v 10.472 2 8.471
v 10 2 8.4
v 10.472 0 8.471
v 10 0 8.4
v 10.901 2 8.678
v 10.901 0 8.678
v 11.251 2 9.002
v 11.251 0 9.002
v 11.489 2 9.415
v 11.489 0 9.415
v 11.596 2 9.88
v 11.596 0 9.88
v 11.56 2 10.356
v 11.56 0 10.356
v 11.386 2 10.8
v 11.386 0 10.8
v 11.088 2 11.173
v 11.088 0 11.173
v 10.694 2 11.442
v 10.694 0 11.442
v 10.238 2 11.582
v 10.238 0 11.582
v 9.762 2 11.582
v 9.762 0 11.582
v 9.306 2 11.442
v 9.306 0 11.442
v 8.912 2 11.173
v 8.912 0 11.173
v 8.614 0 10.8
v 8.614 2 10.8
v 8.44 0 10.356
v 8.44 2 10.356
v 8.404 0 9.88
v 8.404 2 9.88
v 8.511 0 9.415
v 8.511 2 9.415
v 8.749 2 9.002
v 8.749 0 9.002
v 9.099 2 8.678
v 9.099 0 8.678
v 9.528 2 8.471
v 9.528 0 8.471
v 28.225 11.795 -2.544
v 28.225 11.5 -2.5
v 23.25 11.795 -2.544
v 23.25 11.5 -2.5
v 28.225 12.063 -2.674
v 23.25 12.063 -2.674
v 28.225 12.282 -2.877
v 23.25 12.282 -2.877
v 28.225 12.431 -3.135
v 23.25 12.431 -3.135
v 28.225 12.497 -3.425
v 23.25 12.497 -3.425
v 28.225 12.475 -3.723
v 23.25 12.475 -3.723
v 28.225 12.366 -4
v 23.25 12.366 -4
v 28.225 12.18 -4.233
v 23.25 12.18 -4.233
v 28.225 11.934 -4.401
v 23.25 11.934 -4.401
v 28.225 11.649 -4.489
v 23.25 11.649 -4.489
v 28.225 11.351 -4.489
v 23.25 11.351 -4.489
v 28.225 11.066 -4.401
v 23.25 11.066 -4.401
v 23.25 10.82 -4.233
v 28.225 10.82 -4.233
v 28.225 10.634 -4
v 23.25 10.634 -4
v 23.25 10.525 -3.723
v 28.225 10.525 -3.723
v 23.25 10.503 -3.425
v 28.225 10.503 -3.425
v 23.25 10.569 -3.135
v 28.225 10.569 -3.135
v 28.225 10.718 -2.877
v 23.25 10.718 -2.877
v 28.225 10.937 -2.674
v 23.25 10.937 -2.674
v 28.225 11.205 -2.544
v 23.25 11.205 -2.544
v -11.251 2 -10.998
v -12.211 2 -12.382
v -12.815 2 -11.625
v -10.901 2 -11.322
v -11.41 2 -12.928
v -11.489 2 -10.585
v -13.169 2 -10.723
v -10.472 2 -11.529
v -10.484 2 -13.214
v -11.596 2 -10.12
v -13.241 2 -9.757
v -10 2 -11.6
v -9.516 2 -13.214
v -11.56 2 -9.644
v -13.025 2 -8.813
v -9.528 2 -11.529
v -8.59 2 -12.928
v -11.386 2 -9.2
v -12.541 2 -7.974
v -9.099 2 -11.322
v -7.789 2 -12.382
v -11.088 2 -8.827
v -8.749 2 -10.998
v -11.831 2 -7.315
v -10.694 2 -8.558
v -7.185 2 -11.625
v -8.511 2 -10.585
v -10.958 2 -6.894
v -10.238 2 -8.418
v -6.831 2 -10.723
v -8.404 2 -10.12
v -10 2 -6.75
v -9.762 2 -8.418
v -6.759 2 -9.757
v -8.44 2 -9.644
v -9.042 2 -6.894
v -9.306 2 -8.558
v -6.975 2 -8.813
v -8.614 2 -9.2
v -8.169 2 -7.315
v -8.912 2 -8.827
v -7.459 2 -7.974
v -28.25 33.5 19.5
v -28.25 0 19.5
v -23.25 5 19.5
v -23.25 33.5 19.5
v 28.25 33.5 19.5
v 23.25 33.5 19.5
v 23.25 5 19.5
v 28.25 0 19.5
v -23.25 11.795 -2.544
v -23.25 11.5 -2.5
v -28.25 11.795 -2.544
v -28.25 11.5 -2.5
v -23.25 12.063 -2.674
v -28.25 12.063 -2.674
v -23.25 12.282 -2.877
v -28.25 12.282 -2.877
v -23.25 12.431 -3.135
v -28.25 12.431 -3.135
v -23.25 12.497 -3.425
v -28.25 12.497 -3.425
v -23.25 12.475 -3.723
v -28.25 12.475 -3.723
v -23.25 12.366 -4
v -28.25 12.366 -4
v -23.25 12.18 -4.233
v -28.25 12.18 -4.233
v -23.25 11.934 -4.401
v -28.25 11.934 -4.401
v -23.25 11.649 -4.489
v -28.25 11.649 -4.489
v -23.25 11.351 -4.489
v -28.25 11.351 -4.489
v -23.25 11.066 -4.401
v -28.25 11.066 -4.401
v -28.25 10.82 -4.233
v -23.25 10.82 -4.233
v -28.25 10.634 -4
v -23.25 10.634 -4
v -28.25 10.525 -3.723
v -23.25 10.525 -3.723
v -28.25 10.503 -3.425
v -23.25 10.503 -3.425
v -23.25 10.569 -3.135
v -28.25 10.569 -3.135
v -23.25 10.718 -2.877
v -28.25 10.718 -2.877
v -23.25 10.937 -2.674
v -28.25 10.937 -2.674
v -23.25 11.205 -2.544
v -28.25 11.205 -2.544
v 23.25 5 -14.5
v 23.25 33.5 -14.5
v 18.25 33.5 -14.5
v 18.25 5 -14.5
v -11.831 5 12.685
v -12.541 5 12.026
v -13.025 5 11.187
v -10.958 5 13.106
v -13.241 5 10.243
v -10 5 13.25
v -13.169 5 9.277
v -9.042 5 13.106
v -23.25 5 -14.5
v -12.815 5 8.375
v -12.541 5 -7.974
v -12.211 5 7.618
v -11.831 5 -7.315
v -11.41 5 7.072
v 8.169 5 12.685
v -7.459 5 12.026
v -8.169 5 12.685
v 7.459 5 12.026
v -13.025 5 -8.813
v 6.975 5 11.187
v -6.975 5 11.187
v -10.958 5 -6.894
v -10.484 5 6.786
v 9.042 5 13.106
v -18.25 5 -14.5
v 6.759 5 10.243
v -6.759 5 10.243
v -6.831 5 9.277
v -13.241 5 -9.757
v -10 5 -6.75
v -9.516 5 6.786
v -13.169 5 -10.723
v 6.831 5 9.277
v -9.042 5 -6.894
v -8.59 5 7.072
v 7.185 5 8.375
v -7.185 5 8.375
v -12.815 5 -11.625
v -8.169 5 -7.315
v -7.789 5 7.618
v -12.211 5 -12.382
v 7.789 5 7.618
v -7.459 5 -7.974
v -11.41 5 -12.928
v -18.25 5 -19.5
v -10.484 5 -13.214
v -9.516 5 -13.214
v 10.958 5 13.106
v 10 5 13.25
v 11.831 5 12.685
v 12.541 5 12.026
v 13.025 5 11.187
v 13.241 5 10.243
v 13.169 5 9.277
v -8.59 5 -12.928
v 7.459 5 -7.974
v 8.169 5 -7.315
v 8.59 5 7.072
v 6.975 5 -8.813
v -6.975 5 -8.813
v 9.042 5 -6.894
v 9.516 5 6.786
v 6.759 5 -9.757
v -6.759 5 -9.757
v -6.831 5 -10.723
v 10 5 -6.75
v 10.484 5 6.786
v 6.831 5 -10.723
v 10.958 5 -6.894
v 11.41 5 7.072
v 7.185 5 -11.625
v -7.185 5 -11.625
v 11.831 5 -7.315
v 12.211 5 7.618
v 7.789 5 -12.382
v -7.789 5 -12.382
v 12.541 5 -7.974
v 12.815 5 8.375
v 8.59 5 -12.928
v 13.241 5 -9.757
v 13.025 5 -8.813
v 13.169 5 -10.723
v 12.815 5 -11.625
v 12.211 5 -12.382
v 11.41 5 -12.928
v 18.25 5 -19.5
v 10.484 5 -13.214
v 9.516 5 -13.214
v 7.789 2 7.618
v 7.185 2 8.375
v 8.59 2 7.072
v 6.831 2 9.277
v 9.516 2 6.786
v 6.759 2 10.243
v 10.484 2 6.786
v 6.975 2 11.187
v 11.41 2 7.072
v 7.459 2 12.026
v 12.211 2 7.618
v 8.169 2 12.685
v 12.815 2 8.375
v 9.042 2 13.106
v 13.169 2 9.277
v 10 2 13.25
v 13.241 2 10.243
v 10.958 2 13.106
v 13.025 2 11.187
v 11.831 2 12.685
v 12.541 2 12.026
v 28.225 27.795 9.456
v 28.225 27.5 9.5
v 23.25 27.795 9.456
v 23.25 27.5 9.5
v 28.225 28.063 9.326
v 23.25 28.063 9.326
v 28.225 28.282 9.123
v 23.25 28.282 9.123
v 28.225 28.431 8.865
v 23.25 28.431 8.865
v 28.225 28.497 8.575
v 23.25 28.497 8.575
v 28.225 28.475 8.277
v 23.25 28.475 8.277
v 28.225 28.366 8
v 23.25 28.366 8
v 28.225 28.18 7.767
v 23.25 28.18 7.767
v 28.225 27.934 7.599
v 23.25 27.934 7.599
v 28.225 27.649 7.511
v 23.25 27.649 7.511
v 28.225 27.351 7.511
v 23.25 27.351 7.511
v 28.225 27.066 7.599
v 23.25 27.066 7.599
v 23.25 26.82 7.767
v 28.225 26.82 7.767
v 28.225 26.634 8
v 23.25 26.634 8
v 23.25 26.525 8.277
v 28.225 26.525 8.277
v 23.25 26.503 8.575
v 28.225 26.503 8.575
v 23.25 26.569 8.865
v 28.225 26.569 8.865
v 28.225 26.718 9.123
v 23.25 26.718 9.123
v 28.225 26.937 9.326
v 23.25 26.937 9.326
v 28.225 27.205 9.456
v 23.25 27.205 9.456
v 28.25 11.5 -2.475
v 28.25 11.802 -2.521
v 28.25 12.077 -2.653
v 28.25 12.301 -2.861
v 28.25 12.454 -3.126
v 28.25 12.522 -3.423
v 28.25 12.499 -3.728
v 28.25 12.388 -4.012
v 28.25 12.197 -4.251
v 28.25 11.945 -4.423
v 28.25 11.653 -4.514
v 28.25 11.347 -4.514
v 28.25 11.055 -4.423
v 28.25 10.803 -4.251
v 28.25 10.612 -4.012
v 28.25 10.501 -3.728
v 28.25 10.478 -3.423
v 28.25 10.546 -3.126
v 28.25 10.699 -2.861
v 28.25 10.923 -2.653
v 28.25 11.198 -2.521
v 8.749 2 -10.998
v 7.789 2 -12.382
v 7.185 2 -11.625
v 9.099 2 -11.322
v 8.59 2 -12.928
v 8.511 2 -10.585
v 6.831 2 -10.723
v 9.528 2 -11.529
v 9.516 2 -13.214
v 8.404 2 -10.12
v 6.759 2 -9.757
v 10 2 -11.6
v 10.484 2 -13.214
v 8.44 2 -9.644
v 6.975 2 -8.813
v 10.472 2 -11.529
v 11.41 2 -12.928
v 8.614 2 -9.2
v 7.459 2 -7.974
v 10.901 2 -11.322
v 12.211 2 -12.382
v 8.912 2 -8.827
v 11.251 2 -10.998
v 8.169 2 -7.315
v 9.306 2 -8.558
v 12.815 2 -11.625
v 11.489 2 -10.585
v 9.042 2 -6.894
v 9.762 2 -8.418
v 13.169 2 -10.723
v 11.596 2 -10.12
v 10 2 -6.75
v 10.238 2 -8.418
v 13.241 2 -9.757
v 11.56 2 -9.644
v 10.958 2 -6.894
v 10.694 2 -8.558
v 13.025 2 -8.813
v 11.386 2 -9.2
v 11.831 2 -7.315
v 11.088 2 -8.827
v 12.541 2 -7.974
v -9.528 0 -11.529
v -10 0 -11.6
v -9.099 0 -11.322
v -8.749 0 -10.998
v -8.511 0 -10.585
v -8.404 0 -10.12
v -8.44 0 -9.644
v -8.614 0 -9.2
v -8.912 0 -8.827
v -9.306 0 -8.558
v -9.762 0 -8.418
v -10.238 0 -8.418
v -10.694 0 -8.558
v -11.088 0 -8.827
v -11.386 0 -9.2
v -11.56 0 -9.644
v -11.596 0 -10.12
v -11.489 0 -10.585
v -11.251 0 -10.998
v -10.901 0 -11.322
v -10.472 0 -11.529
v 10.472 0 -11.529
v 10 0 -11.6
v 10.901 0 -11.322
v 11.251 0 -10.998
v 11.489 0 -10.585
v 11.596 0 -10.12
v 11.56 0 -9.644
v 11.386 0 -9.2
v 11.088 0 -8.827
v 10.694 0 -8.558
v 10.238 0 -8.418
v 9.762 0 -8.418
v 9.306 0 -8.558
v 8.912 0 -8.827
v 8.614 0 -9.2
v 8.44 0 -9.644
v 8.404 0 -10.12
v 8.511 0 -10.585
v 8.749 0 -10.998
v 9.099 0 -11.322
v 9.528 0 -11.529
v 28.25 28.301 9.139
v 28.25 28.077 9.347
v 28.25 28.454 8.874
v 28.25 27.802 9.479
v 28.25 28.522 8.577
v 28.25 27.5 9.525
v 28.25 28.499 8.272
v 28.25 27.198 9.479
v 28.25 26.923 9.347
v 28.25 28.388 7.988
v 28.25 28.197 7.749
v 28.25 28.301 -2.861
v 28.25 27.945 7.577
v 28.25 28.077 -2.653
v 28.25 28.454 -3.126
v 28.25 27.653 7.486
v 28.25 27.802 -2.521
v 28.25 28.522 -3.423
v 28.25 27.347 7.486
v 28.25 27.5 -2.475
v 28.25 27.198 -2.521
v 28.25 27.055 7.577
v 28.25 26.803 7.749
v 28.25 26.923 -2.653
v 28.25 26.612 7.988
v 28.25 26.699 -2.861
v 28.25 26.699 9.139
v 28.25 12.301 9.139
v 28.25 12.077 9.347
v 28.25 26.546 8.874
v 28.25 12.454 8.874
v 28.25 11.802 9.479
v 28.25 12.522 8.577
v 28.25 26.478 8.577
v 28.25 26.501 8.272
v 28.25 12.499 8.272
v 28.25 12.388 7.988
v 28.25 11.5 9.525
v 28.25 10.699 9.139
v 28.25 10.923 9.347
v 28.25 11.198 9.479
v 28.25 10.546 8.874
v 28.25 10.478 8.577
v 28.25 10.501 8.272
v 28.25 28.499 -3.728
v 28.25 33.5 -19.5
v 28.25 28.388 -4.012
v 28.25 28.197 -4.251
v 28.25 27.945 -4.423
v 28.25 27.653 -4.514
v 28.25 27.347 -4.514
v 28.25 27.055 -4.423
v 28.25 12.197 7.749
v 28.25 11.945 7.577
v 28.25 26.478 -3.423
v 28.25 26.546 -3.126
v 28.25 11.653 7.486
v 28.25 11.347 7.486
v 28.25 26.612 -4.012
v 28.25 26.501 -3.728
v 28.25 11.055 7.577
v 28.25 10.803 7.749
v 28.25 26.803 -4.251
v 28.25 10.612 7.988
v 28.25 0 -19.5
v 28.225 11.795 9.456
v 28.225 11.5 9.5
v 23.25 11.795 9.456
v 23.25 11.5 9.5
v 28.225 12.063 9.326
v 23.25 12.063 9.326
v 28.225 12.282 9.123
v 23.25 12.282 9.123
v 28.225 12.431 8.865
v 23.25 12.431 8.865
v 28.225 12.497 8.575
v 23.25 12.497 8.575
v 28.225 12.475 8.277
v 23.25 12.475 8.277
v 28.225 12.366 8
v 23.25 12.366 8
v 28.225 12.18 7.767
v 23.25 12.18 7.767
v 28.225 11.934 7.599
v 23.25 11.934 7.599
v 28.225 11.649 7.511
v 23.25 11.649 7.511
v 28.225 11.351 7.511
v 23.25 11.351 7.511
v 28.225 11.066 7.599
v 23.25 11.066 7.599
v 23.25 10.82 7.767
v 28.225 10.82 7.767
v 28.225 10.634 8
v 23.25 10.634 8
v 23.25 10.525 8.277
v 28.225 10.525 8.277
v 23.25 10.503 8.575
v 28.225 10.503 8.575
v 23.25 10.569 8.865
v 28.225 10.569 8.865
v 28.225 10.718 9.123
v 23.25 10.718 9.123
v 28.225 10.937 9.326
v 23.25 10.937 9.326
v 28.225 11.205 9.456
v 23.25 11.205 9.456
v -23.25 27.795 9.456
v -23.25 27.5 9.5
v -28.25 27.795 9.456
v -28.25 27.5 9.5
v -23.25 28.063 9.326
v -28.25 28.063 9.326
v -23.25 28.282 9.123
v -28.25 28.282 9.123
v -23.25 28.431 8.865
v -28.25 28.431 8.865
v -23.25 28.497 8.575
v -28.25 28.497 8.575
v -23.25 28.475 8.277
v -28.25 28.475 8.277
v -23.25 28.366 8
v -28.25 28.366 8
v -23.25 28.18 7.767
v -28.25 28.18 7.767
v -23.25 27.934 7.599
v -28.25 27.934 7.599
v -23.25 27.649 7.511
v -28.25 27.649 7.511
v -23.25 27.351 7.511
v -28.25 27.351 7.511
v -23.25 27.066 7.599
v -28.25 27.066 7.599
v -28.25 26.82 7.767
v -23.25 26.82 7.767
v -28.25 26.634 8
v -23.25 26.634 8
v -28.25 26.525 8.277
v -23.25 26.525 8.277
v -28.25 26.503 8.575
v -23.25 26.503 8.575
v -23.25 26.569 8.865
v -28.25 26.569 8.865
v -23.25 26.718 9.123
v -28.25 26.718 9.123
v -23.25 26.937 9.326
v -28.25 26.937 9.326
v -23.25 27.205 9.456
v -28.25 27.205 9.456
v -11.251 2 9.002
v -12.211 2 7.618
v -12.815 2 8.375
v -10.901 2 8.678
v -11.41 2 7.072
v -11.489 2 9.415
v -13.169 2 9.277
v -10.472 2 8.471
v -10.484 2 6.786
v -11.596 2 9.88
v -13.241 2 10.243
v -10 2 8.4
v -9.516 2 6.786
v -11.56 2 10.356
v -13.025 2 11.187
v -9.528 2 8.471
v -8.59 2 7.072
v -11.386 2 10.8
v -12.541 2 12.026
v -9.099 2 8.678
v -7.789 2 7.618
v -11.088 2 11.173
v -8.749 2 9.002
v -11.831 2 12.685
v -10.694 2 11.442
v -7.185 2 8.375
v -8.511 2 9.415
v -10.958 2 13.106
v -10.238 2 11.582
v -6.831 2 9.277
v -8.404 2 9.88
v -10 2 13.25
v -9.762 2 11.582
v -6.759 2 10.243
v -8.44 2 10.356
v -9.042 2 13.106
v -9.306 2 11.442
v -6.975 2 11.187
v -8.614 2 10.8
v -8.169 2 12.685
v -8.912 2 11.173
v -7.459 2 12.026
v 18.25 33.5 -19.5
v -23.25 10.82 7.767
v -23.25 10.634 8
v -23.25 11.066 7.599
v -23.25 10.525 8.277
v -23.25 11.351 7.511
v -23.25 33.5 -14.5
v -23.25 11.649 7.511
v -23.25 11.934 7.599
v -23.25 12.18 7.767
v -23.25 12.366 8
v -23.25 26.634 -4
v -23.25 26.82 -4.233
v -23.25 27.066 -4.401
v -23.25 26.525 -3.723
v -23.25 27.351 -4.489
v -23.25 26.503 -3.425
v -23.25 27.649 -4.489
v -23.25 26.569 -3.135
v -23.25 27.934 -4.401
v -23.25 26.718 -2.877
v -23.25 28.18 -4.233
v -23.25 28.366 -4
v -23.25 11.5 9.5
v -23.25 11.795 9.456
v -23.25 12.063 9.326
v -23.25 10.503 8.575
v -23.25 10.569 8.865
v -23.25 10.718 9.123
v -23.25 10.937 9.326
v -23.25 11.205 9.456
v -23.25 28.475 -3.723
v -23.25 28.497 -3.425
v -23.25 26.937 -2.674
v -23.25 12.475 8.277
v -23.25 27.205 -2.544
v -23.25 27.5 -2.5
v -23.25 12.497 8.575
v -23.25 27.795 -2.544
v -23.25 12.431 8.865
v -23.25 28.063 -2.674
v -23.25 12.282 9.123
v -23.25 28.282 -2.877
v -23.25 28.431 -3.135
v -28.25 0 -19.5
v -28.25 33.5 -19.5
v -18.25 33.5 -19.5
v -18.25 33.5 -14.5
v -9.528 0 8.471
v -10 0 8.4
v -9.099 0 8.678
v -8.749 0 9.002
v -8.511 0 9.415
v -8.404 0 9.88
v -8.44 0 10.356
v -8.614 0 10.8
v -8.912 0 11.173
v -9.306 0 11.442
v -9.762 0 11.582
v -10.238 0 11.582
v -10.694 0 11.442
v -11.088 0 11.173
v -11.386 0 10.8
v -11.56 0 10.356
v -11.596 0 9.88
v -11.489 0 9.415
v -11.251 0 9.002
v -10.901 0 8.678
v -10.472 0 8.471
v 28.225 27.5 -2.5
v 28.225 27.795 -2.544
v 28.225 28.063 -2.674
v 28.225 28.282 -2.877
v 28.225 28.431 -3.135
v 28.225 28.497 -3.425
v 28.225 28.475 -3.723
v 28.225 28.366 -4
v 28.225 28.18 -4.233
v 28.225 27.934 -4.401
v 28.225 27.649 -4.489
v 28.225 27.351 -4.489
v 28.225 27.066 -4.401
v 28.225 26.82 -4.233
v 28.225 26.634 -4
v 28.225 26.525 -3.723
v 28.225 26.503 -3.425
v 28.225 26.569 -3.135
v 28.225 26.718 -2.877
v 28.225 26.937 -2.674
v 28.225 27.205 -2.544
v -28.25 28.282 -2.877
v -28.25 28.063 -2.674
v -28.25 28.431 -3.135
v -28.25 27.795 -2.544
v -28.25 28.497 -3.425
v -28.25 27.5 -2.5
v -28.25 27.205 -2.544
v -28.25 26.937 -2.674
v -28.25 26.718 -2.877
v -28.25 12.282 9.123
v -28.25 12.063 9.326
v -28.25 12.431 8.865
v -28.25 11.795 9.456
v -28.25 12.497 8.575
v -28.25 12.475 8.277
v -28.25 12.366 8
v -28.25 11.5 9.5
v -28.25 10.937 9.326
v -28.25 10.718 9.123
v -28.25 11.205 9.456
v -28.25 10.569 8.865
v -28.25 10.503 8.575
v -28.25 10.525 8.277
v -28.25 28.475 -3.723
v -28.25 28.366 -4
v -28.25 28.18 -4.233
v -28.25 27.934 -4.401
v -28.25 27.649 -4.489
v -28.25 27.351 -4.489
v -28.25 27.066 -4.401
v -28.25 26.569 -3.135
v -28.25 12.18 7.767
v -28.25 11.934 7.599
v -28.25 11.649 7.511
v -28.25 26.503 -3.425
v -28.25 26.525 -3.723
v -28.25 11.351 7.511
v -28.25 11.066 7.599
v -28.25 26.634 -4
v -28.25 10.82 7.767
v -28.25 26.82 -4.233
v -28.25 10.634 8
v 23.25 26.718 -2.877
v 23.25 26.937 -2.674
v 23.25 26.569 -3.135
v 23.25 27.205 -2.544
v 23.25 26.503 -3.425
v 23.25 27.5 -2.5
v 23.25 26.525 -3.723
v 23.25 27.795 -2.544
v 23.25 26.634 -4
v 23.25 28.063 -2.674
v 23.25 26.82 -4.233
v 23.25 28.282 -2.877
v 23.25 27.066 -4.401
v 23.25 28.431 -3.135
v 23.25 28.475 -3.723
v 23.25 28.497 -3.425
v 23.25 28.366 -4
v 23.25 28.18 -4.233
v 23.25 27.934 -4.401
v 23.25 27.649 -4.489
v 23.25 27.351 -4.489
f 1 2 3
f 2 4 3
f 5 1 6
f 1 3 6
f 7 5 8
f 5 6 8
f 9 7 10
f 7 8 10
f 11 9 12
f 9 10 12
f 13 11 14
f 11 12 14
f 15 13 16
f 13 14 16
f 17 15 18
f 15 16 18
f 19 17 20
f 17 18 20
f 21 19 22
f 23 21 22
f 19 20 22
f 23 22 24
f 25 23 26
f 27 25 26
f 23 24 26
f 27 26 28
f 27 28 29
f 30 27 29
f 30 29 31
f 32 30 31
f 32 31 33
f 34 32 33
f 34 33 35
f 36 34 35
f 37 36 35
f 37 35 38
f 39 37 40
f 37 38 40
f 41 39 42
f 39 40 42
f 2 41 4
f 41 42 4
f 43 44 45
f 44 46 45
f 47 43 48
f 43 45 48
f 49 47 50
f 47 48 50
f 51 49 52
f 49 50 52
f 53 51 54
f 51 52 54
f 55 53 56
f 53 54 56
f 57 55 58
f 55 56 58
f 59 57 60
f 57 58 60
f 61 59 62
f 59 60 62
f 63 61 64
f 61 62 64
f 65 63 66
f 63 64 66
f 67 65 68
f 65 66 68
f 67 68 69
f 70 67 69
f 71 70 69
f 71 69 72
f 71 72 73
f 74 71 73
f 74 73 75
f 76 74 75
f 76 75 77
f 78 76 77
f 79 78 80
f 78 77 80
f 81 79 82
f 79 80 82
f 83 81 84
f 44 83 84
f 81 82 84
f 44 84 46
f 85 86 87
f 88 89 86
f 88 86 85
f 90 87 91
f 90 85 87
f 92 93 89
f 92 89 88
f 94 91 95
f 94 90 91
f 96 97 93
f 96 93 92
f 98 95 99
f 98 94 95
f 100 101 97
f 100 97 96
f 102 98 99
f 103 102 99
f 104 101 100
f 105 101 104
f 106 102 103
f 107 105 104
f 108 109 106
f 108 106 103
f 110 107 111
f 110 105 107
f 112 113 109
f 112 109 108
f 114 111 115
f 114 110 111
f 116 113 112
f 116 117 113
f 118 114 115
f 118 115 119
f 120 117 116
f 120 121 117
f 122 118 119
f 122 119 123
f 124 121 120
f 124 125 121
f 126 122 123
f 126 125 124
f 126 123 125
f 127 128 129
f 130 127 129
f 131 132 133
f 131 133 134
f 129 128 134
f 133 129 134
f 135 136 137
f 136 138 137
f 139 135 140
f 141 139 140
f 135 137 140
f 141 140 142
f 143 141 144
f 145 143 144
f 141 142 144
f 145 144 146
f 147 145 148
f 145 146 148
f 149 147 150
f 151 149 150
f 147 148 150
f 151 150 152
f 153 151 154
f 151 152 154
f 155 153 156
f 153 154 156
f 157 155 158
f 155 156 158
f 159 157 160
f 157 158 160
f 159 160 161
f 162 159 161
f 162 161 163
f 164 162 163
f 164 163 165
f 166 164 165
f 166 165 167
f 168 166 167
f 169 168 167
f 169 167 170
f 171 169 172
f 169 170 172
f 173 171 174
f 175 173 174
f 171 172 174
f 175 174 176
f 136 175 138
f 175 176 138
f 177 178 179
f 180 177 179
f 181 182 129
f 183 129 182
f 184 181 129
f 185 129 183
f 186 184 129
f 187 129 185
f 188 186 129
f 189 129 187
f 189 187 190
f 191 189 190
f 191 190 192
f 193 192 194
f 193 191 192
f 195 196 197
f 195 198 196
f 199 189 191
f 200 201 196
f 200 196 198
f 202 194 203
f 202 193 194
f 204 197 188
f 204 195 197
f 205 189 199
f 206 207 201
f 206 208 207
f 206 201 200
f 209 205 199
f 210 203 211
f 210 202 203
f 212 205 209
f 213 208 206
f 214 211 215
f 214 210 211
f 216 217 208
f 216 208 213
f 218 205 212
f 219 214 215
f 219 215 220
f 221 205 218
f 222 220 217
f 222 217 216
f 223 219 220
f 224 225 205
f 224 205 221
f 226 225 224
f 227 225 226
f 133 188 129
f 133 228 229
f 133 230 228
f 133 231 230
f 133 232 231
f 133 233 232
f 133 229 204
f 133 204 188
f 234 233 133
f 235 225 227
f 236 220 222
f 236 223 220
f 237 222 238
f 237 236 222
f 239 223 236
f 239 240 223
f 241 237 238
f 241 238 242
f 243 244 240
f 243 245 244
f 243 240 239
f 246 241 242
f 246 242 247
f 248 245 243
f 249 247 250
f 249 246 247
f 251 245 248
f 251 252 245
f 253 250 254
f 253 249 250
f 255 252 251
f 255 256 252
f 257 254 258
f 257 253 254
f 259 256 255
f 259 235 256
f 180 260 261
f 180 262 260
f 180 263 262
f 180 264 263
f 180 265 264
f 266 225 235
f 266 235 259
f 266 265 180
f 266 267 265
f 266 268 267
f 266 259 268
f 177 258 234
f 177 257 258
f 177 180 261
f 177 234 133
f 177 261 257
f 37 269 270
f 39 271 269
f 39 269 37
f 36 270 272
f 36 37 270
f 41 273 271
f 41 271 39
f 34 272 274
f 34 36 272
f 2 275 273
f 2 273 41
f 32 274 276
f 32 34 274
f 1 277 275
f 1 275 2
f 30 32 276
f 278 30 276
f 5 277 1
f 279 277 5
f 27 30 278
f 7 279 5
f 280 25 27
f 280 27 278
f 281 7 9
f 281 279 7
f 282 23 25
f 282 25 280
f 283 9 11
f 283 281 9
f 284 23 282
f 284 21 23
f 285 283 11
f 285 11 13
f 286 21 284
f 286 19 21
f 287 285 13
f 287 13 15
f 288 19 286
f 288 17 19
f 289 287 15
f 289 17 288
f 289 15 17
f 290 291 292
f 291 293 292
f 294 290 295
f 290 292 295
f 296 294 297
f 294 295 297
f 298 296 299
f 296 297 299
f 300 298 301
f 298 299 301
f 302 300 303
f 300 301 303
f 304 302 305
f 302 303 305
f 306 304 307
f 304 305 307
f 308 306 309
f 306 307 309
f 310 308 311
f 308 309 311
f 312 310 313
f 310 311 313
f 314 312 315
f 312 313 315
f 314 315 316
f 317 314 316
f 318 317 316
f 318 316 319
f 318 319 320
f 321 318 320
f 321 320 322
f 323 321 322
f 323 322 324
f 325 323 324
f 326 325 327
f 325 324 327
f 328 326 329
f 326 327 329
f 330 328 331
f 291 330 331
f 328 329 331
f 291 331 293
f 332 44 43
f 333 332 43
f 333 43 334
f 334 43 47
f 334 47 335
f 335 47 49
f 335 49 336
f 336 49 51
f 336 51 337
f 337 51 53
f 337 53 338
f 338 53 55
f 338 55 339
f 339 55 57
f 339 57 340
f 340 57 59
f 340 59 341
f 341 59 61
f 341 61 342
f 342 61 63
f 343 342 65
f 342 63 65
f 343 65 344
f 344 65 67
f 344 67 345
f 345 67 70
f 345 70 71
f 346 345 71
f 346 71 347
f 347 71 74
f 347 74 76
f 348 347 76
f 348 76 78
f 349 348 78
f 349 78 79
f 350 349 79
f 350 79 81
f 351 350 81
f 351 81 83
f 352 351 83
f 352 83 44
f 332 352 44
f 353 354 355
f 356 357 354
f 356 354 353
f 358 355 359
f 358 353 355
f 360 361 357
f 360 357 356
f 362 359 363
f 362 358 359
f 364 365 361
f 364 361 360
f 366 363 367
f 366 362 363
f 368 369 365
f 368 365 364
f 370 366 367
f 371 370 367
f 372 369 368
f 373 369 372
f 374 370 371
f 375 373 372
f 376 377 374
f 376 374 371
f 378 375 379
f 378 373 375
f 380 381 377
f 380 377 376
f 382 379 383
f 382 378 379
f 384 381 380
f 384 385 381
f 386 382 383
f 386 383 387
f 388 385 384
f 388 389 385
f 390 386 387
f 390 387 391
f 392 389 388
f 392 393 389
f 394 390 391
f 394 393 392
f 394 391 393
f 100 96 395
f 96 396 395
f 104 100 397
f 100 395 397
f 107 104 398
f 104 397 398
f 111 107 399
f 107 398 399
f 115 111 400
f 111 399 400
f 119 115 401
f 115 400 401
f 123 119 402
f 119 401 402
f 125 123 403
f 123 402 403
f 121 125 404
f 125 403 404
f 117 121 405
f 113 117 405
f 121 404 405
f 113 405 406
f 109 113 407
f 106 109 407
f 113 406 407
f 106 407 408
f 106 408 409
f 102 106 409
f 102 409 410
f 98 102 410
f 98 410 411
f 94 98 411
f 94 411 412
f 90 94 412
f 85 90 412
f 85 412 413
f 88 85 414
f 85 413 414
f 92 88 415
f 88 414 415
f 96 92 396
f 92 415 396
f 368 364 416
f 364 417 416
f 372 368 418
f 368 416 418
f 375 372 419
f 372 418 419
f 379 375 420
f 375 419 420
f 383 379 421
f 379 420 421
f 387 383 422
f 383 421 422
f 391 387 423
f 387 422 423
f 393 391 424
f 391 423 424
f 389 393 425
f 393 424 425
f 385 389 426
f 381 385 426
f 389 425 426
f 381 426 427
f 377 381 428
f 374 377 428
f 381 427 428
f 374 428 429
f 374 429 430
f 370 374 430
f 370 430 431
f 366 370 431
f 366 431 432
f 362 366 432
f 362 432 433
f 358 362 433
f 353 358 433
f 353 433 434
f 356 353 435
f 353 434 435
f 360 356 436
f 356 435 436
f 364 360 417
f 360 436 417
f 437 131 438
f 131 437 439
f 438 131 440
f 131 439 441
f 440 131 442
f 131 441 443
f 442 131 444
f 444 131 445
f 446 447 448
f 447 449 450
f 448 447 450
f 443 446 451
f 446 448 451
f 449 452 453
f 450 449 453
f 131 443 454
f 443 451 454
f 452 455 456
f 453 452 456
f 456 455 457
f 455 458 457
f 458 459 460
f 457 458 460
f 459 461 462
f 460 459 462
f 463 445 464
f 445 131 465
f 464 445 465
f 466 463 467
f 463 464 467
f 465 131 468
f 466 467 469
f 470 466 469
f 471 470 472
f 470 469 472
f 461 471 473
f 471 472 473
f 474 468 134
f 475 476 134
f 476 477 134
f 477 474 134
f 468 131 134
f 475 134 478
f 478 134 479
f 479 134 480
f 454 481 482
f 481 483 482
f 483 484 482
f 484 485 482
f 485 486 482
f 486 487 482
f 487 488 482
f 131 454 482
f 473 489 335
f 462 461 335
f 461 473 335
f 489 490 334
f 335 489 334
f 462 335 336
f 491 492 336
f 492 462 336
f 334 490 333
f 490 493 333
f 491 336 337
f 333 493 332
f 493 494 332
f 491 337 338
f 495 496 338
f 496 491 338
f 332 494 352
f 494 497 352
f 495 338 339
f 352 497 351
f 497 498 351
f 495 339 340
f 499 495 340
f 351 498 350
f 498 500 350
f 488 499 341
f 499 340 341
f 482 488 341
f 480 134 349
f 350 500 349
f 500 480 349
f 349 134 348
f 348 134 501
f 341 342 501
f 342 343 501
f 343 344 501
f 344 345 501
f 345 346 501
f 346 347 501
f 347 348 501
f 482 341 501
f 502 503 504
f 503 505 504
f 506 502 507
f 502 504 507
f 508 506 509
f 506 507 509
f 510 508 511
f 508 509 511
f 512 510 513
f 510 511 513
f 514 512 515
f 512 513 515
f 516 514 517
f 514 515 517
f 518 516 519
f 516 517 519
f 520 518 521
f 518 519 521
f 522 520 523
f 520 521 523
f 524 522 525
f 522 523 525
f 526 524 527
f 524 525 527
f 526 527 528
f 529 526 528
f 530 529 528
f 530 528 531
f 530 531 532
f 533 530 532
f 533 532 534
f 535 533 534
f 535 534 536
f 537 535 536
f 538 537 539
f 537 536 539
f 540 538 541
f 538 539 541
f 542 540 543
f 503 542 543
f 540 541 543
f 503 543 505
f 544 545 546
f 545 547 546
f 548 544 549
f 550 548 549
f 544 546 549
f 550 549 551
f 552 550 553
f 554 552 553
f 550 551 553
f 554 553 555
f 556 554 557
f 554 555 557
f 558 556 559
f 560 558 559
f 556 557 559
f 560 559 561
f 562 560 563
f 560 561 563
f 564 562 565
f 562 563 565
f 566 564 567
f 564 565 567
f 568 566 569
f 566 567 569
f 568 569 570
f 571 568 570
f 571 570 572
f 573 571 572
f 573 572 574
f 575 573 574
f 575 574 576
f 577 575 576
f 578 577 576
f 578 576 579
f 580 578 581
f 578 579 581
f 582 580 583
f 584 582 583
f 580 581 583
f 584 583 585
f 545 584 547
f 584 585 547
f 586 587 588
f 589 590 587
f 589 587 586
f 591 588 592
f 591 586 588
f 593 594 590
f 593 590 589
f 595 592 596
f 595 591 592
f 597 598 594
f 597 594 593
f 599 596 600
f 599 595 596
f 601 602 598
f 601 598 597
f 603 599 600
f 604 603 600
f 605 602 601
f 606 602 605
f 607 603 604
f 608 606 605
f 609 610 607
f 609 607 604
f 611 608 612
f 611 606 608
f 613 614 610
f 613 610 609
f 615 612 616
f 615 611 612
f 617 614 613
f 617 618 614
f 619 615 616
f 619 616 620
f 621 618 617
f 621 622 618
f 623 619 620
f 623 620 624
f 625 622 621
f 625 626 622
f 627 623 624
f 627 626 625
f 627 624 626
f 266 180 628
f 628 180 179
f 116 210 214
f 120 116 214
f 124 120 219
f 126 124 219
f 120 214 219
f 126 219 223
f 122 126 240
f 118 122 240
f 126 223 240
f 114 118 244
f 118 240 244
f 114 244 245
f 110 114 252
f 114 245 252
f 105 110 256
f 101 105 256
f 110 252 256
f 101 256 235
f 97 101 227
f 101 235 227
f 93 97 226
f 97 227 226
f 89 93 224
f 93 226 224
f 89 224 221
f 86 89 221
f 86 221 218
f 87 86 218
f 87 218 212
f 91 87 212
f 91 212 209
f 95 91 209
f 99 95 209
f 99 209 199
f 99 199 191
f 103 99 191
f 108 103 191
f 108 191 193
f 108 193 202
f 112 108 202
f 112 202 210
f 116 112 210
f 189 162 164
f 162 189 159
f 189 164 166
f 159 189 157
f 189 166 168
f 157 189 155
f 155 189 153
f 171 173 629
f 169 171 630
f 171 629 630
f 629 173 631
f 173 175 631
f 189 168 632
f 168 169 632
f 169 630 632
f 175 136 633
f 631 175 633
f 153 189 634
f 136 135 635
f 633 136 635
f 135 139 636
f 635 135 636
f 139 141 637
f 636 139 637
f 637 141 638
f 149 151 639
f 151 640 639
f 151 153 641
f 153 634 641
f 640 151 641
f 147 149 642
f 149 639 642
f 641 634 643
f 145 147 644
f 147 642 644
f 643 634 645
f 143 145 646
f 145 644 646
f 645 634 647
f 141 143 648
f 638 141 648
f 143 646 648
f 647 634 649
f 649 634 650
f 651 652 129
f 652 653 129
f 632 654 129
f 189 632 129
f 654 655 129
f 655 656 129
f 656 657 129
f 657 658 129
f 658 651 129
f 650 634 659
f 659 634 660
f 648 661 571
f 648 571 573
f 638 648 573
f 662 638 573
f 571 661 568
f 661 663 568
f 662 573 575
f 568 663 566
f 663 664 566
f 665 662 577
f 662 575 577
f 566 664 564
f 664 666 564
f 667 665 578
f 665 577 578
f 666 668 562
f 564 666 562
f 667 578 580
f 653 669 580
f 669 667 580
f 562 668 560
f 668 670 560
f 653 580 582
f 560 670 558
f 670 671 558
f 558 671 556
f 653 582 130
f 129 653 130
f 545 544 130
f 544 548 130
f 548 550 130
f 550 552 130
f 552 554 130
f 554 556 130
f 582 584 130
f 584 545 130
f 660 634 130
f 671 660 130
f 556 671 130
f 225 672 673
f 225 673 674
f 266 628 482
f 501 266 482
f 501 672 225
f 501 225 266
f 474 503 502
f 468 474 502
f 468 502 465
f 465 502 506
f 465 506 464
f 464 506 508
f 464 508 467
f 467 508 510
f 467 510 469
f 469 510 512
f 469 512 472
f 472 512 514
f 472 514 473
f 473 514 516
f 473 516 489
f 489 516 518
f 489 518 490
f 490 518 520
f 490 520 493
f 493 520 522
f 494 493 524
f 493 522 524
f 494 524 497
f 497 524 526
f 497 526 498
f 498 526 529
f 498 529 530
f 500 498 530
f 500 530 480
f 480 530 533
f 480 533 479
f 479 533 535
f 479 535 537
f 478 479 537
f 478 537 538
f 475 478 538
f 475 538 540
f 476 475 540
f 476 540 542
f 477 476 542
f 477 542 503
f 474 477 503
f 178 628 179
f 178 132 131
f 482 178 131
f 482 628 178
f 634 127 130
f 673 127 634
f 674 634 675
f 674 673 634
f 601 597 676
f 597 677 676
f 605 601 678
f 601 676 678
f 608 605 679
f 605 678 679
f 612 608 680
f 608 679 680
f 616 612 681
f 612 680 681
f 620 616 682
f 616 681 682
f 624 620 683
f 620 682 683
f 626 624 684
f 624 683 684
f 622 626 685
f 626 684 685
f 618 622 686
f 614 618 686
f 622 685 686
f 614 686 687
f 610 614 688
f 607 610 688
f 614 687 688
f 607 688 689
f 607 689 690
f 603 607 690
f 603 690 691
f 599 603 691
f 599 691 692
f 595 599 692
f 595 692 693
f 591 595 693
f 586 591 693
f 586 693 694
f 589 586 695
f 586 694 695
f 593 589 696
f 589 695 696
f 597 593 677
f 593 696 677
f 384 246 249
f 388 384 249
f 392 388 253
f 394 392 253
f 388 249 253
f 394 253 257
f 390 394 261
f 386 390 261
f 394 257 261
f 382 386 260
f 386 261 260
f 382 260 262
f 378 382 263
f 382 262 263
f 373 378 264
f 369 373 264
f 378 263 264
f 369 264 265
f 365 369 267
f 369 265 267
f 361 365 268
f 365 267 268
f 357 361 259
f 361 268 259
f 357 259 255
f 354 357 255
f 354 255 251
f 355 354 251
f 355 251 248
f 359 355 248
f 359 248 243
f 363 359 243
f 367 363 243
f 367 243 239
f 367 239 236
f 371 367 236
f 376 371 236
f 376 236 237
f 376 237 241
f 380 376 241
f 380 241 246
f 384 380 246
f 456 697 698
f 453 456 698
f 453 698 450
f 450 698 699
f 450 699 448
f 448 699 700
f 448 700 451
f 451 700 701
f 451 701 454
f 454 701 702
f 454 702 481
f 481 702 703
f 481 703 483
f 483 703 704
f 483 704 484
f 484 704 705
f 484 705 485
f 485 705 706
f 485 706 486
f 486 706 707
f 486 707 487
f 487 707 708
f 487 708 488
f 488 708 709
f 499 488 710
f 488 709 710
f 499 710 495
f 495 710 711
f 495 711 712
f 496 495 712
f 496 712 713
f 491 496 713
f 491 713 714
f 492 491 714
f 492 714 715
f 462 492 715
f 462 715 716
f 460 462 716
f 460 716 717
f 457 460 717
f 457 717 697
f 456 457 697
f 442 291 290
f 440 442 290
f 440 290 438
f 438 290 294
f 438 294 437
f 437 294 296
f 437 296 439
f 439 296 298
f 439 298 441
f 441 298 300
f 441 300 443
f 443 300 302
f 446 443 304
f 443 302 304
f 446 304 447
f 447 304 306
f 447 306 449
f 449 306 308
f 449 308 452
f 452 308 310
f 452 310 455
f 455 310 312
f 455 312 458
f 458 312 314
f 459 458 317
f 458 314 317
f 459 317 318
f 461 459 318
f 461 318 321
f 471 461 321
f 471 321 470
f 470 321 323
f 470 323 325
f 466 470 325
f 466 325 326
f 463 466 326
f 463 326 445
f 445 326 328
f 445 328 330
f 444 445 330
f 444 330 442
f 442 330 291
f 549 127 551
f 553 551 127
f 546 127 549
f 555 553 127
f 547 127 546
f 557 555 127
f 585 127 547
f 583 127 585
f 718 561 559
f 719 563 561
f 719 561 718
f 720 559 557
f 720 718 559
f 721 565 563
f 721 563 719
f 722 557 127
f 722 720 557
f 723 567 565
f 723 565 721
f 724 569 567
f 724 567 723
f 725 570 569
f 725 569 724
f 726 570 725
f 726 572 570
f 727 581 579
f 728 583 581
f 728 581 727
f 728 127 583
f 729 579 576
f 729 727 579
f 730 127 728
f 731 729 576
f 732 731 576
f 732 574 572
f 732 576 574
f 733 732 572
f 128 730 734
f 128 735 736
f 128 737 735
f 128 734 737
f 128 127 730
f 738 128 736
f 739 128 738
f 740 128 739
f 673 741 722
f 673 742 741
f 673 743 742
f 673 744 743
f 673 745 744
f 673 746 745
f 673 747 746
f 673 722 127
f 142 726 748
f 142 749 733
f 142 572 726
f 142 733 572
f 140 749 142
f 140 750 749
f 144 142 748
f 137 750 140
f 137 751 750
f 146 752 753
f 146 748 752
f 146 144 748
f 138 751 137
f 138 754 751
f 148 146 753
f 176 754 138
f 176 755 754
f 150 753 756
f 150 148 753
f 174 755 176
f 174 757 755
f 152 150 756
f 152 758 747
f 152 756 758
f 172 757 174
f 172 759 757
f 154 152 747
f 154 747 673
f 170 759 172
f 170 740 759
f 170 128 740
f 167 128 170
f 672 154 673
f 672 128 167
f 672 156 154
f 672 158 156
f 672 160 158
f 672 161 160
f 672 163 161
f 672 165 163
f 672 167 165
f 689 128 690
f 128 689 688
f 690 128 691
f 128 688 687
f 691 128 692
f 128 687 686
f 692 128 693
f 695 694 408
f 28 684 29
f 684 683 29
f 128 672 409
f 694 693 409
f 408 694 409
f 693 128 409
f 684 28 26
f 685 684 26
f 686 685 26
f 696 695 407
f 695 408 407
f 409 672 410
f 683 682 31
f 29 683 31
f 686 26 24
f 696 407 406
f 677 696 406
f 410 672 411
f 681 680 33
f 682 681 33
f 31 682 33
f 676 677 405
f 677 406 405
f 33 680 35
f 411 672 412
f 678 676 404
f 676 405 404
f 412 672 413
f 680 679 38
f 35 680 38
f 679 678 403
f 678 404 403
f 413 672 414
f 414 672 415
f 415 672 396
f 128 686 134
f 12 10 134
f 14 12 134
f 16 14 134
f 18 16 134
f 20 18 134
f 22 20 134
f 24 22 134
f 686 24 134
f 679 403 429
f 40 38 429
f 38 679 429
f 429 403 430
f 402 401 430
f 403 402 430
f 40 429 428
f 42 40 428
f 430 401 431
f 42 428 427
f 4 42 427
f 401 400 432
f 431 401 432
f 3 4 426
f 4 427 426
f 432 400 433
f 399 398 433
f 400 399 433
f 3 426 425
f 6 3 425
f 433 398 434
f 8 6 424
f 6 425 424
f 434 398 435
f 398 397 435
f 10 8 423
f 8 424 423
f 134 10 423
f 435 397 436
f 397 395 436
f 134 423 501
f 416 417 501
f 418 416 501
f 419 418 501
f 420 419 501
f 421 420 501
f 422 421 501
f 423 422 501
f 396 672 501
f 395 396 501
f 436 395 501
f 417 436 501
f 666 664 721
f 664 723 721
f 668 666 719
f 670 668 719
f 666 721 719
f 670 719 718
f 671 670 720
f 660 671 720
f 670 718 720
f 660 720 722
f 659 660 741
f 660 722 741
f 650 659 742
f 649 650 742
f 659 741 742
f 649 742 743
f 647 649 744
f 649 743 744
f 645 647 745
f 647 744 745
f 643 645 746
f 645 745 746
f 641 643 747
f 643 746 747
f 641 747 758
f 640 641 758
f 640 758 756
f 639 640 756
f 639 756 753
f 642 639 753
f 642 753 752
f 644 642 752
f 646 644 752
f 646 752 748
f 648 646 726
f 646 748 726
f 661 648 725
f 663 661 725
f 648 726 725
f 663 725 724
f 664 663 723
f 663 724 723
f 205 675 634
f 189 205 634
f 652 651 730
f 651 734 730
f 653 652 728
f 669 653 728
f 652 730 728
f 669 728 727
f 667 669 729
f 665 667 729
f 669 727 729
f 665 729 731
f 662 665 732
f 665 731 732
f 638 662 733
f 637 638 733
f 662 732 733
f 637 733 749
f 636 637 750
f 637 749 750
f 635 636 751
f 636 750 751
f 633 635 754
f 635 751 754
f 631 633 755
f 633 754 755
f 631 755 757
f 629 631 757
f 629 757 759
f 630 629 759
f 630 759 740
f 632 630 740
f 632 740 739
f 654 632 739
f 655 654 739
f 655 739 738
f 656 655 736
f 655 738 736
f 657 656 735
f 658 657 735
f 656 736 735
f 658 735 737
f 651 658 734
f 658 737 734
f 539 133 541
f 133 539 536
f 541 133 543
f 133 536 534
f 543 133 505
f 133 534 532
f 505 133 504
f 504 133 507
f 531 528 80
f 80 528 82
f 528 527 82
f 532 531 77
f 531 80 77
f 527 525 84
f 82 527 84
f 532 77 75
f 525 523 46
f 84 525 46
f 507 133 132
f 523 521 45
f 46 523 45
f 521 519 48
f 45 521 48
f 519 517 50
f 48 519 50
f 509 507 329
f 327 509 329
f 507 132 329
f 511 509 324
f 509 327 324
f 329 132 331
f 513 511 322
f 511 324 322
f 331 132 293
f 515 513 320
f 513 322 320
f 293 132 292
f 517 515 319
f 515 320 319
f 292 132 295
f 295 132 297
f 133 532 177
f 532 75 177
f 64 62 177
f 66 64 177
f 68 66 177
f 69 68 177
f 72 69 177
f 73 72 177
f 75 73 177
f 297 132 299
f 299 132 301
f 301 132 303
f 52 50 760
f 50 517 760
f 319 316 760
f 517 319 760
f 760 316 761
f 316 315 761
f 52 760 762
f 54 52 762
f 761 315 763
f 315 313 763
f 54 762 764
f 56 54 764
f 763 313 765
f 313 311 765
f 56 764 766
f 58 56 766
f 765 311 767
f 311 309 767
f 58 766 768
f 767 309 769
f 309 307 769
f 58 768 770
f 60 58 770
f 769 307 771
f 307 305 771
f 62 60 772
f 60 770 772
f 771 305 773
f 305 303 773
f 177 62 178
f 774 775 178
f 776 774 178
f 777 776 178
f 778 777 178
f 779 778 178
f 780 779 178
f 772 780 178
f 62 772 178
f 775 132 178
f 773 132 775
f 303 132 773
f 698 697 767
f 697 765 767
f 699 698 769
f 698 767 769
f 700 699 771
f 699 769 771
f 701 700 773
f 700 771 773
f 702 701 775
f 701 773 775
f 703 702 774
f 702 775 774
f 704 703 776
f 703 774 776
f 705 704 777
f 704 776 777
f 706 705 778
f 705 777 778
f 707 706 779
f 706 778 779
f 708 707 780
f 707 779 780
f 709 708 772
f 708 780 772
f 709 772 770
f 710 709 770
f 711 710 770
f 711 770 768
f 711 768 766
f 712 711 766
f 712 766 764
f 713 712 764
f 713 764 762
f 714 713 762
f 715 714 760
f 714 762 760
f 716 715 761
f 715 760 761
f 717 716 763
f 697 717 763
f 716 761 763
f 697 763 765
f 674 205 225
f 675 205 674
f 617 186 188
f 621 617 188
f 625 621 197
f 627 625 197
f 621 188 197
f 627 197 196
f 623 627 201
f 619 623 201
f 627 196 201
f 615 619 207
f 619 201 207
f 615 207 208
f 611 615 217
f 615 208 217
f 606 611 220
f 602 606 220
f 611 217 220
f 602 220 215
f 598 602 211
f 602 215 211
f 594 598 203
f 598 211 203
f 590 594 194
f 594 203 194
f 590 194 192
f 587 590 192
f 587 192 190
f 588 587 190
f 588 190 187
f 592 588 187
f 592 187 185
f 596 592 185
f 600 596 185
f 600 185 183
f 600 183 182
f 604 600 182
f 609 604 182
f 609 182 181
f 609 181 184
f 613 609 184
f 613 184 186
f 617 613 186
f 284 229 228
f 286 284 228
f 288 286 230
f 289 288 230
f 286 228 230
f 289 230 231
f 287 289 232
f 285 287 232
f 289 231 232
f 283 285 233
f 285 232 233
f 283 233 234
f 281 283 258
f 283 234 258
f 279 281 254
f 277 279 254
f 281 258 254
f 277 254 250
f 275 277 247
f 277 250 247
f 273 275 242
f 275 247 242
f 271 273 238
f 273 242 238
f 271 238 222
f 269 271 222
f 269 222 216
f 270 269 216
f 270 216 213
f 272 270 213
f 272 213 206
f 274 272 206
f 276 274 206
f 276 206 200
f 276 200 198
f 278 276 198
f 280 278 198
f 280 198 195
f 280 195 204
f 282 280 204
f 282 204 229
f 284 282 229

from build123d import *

# Parameters (mm, degrees)
SKETCH9_W                                       = 56.5
SKETCH9_H                                       = 39
BOSS_EXTRUDE7_DEPTH                             = 33.5
CUT_EXTRUDE3_DEPTH                              = 28.5
SKETCH12_W                                      = 36.5
SKETCH12_H                                      = 28.5
CUT_EXTRUDE4_DEPTH                              = 56.464515683
CBORE_FOR_M3_SOCKET_HEAD_CAP_SCREW3_D           = 3.2
CBORE_FOR_M3_SOCKET_HEAD_CAP_SCREW3_CBORE_D     = 6.5
CBORE_FOR_M3_SOCKET_HEAD_CAP_SCREW3_CBORE_DEPTH = 3
F_2_0MM_DOWEL_HOLE1_D                           = 2
F_2_0MM_DOWEL_HOLE1_CSINK_D                     = 2.05
F_2_0MM_DOWEL_HOLE1_CSINK_ANGLE                 = 90


with BuildPart() as part:
    # Sketch9 → Boss-Extrude7 (new body)
    with BuildSketch(Plane(origin=(0, 0, 0), x_dir=(1, 0, 0), z_dir=(0, 1, 0))):
        Rectangle(SKETCH9_W, SKETCH9_H)
    extrude(amount=BOSS_EXTRUDE7_DEPTH)

    # Sketch11 → Cut-Extrude3 (cut)
    with BuildSketch(Plane(origin=(0, 33.5, 0), x_dir=(1, 0, 0), z_dir=(0, 1, 0))):
        Polygon((-23.25, -14.5), (-23.25, -19.5), (23.25, -19.5), (23.25, -14.5), (23.25, 14.5), (-23.25, 14.5), align=None)
    extrude(amount=-CUT_EXTRUDE3_DEPTH, mode=Mode.SUBTRACT)

    # Sketch12 → Cut-Extrude4 (cut, through all)
    with BuildSketch(Plane.XY.offset(-14.5)):
        with Locations((0, 19.25)):
            Rectangle(SKETCH12_W, SKETCH12_H)
    extrude(amount=-CUT_EXTRUDE4_DEPTH, mode=Mode.SUBTRACT)

    # CBORE for M3 Socket Head Cap Screw3 (through all)
    with Locations(Plane(origin=(10, 5, -10), x_dir=(0, 0, 1), z_dir=(0, 1, 0))):
        with Locations((0, 0), (20, 0), (20, -20), (0, -20)):
            CounterBoreHole(CBORE_FOR_M3_SOCKET_HEAD_CAP_SCREW3_D / 2, CBORE_FOR_M3_SOCKET_HEAD_CAP_SCREW3_CBORE_D / 2, CBORE_FOR_M3_SOCKET_HEAD_CAP_SCREW3_CBORE_DEPTH)

    # Ø2.0mm Dowel Hole1 (through all)
    with Locations(Plane(origin=(28.25, 0, 0), x_dir=(0, 0, -1), z_dir=(1, 0, 0))):
        with Locations((-8.5, 27.5), (-8.5, 11.5), (3.5, 11.5), (3.5, 27.5)):
            CounterSinkHole(F_2_0MM_DOWEL_HOLE1_D / 2, F_2_0MM_DOWEL_HOLE1_CSINK_D / 2, counter_sink_angle=F_2_0MM_DOWEL_HOLE1_CSINK_ANGLE)


solid = part.part
